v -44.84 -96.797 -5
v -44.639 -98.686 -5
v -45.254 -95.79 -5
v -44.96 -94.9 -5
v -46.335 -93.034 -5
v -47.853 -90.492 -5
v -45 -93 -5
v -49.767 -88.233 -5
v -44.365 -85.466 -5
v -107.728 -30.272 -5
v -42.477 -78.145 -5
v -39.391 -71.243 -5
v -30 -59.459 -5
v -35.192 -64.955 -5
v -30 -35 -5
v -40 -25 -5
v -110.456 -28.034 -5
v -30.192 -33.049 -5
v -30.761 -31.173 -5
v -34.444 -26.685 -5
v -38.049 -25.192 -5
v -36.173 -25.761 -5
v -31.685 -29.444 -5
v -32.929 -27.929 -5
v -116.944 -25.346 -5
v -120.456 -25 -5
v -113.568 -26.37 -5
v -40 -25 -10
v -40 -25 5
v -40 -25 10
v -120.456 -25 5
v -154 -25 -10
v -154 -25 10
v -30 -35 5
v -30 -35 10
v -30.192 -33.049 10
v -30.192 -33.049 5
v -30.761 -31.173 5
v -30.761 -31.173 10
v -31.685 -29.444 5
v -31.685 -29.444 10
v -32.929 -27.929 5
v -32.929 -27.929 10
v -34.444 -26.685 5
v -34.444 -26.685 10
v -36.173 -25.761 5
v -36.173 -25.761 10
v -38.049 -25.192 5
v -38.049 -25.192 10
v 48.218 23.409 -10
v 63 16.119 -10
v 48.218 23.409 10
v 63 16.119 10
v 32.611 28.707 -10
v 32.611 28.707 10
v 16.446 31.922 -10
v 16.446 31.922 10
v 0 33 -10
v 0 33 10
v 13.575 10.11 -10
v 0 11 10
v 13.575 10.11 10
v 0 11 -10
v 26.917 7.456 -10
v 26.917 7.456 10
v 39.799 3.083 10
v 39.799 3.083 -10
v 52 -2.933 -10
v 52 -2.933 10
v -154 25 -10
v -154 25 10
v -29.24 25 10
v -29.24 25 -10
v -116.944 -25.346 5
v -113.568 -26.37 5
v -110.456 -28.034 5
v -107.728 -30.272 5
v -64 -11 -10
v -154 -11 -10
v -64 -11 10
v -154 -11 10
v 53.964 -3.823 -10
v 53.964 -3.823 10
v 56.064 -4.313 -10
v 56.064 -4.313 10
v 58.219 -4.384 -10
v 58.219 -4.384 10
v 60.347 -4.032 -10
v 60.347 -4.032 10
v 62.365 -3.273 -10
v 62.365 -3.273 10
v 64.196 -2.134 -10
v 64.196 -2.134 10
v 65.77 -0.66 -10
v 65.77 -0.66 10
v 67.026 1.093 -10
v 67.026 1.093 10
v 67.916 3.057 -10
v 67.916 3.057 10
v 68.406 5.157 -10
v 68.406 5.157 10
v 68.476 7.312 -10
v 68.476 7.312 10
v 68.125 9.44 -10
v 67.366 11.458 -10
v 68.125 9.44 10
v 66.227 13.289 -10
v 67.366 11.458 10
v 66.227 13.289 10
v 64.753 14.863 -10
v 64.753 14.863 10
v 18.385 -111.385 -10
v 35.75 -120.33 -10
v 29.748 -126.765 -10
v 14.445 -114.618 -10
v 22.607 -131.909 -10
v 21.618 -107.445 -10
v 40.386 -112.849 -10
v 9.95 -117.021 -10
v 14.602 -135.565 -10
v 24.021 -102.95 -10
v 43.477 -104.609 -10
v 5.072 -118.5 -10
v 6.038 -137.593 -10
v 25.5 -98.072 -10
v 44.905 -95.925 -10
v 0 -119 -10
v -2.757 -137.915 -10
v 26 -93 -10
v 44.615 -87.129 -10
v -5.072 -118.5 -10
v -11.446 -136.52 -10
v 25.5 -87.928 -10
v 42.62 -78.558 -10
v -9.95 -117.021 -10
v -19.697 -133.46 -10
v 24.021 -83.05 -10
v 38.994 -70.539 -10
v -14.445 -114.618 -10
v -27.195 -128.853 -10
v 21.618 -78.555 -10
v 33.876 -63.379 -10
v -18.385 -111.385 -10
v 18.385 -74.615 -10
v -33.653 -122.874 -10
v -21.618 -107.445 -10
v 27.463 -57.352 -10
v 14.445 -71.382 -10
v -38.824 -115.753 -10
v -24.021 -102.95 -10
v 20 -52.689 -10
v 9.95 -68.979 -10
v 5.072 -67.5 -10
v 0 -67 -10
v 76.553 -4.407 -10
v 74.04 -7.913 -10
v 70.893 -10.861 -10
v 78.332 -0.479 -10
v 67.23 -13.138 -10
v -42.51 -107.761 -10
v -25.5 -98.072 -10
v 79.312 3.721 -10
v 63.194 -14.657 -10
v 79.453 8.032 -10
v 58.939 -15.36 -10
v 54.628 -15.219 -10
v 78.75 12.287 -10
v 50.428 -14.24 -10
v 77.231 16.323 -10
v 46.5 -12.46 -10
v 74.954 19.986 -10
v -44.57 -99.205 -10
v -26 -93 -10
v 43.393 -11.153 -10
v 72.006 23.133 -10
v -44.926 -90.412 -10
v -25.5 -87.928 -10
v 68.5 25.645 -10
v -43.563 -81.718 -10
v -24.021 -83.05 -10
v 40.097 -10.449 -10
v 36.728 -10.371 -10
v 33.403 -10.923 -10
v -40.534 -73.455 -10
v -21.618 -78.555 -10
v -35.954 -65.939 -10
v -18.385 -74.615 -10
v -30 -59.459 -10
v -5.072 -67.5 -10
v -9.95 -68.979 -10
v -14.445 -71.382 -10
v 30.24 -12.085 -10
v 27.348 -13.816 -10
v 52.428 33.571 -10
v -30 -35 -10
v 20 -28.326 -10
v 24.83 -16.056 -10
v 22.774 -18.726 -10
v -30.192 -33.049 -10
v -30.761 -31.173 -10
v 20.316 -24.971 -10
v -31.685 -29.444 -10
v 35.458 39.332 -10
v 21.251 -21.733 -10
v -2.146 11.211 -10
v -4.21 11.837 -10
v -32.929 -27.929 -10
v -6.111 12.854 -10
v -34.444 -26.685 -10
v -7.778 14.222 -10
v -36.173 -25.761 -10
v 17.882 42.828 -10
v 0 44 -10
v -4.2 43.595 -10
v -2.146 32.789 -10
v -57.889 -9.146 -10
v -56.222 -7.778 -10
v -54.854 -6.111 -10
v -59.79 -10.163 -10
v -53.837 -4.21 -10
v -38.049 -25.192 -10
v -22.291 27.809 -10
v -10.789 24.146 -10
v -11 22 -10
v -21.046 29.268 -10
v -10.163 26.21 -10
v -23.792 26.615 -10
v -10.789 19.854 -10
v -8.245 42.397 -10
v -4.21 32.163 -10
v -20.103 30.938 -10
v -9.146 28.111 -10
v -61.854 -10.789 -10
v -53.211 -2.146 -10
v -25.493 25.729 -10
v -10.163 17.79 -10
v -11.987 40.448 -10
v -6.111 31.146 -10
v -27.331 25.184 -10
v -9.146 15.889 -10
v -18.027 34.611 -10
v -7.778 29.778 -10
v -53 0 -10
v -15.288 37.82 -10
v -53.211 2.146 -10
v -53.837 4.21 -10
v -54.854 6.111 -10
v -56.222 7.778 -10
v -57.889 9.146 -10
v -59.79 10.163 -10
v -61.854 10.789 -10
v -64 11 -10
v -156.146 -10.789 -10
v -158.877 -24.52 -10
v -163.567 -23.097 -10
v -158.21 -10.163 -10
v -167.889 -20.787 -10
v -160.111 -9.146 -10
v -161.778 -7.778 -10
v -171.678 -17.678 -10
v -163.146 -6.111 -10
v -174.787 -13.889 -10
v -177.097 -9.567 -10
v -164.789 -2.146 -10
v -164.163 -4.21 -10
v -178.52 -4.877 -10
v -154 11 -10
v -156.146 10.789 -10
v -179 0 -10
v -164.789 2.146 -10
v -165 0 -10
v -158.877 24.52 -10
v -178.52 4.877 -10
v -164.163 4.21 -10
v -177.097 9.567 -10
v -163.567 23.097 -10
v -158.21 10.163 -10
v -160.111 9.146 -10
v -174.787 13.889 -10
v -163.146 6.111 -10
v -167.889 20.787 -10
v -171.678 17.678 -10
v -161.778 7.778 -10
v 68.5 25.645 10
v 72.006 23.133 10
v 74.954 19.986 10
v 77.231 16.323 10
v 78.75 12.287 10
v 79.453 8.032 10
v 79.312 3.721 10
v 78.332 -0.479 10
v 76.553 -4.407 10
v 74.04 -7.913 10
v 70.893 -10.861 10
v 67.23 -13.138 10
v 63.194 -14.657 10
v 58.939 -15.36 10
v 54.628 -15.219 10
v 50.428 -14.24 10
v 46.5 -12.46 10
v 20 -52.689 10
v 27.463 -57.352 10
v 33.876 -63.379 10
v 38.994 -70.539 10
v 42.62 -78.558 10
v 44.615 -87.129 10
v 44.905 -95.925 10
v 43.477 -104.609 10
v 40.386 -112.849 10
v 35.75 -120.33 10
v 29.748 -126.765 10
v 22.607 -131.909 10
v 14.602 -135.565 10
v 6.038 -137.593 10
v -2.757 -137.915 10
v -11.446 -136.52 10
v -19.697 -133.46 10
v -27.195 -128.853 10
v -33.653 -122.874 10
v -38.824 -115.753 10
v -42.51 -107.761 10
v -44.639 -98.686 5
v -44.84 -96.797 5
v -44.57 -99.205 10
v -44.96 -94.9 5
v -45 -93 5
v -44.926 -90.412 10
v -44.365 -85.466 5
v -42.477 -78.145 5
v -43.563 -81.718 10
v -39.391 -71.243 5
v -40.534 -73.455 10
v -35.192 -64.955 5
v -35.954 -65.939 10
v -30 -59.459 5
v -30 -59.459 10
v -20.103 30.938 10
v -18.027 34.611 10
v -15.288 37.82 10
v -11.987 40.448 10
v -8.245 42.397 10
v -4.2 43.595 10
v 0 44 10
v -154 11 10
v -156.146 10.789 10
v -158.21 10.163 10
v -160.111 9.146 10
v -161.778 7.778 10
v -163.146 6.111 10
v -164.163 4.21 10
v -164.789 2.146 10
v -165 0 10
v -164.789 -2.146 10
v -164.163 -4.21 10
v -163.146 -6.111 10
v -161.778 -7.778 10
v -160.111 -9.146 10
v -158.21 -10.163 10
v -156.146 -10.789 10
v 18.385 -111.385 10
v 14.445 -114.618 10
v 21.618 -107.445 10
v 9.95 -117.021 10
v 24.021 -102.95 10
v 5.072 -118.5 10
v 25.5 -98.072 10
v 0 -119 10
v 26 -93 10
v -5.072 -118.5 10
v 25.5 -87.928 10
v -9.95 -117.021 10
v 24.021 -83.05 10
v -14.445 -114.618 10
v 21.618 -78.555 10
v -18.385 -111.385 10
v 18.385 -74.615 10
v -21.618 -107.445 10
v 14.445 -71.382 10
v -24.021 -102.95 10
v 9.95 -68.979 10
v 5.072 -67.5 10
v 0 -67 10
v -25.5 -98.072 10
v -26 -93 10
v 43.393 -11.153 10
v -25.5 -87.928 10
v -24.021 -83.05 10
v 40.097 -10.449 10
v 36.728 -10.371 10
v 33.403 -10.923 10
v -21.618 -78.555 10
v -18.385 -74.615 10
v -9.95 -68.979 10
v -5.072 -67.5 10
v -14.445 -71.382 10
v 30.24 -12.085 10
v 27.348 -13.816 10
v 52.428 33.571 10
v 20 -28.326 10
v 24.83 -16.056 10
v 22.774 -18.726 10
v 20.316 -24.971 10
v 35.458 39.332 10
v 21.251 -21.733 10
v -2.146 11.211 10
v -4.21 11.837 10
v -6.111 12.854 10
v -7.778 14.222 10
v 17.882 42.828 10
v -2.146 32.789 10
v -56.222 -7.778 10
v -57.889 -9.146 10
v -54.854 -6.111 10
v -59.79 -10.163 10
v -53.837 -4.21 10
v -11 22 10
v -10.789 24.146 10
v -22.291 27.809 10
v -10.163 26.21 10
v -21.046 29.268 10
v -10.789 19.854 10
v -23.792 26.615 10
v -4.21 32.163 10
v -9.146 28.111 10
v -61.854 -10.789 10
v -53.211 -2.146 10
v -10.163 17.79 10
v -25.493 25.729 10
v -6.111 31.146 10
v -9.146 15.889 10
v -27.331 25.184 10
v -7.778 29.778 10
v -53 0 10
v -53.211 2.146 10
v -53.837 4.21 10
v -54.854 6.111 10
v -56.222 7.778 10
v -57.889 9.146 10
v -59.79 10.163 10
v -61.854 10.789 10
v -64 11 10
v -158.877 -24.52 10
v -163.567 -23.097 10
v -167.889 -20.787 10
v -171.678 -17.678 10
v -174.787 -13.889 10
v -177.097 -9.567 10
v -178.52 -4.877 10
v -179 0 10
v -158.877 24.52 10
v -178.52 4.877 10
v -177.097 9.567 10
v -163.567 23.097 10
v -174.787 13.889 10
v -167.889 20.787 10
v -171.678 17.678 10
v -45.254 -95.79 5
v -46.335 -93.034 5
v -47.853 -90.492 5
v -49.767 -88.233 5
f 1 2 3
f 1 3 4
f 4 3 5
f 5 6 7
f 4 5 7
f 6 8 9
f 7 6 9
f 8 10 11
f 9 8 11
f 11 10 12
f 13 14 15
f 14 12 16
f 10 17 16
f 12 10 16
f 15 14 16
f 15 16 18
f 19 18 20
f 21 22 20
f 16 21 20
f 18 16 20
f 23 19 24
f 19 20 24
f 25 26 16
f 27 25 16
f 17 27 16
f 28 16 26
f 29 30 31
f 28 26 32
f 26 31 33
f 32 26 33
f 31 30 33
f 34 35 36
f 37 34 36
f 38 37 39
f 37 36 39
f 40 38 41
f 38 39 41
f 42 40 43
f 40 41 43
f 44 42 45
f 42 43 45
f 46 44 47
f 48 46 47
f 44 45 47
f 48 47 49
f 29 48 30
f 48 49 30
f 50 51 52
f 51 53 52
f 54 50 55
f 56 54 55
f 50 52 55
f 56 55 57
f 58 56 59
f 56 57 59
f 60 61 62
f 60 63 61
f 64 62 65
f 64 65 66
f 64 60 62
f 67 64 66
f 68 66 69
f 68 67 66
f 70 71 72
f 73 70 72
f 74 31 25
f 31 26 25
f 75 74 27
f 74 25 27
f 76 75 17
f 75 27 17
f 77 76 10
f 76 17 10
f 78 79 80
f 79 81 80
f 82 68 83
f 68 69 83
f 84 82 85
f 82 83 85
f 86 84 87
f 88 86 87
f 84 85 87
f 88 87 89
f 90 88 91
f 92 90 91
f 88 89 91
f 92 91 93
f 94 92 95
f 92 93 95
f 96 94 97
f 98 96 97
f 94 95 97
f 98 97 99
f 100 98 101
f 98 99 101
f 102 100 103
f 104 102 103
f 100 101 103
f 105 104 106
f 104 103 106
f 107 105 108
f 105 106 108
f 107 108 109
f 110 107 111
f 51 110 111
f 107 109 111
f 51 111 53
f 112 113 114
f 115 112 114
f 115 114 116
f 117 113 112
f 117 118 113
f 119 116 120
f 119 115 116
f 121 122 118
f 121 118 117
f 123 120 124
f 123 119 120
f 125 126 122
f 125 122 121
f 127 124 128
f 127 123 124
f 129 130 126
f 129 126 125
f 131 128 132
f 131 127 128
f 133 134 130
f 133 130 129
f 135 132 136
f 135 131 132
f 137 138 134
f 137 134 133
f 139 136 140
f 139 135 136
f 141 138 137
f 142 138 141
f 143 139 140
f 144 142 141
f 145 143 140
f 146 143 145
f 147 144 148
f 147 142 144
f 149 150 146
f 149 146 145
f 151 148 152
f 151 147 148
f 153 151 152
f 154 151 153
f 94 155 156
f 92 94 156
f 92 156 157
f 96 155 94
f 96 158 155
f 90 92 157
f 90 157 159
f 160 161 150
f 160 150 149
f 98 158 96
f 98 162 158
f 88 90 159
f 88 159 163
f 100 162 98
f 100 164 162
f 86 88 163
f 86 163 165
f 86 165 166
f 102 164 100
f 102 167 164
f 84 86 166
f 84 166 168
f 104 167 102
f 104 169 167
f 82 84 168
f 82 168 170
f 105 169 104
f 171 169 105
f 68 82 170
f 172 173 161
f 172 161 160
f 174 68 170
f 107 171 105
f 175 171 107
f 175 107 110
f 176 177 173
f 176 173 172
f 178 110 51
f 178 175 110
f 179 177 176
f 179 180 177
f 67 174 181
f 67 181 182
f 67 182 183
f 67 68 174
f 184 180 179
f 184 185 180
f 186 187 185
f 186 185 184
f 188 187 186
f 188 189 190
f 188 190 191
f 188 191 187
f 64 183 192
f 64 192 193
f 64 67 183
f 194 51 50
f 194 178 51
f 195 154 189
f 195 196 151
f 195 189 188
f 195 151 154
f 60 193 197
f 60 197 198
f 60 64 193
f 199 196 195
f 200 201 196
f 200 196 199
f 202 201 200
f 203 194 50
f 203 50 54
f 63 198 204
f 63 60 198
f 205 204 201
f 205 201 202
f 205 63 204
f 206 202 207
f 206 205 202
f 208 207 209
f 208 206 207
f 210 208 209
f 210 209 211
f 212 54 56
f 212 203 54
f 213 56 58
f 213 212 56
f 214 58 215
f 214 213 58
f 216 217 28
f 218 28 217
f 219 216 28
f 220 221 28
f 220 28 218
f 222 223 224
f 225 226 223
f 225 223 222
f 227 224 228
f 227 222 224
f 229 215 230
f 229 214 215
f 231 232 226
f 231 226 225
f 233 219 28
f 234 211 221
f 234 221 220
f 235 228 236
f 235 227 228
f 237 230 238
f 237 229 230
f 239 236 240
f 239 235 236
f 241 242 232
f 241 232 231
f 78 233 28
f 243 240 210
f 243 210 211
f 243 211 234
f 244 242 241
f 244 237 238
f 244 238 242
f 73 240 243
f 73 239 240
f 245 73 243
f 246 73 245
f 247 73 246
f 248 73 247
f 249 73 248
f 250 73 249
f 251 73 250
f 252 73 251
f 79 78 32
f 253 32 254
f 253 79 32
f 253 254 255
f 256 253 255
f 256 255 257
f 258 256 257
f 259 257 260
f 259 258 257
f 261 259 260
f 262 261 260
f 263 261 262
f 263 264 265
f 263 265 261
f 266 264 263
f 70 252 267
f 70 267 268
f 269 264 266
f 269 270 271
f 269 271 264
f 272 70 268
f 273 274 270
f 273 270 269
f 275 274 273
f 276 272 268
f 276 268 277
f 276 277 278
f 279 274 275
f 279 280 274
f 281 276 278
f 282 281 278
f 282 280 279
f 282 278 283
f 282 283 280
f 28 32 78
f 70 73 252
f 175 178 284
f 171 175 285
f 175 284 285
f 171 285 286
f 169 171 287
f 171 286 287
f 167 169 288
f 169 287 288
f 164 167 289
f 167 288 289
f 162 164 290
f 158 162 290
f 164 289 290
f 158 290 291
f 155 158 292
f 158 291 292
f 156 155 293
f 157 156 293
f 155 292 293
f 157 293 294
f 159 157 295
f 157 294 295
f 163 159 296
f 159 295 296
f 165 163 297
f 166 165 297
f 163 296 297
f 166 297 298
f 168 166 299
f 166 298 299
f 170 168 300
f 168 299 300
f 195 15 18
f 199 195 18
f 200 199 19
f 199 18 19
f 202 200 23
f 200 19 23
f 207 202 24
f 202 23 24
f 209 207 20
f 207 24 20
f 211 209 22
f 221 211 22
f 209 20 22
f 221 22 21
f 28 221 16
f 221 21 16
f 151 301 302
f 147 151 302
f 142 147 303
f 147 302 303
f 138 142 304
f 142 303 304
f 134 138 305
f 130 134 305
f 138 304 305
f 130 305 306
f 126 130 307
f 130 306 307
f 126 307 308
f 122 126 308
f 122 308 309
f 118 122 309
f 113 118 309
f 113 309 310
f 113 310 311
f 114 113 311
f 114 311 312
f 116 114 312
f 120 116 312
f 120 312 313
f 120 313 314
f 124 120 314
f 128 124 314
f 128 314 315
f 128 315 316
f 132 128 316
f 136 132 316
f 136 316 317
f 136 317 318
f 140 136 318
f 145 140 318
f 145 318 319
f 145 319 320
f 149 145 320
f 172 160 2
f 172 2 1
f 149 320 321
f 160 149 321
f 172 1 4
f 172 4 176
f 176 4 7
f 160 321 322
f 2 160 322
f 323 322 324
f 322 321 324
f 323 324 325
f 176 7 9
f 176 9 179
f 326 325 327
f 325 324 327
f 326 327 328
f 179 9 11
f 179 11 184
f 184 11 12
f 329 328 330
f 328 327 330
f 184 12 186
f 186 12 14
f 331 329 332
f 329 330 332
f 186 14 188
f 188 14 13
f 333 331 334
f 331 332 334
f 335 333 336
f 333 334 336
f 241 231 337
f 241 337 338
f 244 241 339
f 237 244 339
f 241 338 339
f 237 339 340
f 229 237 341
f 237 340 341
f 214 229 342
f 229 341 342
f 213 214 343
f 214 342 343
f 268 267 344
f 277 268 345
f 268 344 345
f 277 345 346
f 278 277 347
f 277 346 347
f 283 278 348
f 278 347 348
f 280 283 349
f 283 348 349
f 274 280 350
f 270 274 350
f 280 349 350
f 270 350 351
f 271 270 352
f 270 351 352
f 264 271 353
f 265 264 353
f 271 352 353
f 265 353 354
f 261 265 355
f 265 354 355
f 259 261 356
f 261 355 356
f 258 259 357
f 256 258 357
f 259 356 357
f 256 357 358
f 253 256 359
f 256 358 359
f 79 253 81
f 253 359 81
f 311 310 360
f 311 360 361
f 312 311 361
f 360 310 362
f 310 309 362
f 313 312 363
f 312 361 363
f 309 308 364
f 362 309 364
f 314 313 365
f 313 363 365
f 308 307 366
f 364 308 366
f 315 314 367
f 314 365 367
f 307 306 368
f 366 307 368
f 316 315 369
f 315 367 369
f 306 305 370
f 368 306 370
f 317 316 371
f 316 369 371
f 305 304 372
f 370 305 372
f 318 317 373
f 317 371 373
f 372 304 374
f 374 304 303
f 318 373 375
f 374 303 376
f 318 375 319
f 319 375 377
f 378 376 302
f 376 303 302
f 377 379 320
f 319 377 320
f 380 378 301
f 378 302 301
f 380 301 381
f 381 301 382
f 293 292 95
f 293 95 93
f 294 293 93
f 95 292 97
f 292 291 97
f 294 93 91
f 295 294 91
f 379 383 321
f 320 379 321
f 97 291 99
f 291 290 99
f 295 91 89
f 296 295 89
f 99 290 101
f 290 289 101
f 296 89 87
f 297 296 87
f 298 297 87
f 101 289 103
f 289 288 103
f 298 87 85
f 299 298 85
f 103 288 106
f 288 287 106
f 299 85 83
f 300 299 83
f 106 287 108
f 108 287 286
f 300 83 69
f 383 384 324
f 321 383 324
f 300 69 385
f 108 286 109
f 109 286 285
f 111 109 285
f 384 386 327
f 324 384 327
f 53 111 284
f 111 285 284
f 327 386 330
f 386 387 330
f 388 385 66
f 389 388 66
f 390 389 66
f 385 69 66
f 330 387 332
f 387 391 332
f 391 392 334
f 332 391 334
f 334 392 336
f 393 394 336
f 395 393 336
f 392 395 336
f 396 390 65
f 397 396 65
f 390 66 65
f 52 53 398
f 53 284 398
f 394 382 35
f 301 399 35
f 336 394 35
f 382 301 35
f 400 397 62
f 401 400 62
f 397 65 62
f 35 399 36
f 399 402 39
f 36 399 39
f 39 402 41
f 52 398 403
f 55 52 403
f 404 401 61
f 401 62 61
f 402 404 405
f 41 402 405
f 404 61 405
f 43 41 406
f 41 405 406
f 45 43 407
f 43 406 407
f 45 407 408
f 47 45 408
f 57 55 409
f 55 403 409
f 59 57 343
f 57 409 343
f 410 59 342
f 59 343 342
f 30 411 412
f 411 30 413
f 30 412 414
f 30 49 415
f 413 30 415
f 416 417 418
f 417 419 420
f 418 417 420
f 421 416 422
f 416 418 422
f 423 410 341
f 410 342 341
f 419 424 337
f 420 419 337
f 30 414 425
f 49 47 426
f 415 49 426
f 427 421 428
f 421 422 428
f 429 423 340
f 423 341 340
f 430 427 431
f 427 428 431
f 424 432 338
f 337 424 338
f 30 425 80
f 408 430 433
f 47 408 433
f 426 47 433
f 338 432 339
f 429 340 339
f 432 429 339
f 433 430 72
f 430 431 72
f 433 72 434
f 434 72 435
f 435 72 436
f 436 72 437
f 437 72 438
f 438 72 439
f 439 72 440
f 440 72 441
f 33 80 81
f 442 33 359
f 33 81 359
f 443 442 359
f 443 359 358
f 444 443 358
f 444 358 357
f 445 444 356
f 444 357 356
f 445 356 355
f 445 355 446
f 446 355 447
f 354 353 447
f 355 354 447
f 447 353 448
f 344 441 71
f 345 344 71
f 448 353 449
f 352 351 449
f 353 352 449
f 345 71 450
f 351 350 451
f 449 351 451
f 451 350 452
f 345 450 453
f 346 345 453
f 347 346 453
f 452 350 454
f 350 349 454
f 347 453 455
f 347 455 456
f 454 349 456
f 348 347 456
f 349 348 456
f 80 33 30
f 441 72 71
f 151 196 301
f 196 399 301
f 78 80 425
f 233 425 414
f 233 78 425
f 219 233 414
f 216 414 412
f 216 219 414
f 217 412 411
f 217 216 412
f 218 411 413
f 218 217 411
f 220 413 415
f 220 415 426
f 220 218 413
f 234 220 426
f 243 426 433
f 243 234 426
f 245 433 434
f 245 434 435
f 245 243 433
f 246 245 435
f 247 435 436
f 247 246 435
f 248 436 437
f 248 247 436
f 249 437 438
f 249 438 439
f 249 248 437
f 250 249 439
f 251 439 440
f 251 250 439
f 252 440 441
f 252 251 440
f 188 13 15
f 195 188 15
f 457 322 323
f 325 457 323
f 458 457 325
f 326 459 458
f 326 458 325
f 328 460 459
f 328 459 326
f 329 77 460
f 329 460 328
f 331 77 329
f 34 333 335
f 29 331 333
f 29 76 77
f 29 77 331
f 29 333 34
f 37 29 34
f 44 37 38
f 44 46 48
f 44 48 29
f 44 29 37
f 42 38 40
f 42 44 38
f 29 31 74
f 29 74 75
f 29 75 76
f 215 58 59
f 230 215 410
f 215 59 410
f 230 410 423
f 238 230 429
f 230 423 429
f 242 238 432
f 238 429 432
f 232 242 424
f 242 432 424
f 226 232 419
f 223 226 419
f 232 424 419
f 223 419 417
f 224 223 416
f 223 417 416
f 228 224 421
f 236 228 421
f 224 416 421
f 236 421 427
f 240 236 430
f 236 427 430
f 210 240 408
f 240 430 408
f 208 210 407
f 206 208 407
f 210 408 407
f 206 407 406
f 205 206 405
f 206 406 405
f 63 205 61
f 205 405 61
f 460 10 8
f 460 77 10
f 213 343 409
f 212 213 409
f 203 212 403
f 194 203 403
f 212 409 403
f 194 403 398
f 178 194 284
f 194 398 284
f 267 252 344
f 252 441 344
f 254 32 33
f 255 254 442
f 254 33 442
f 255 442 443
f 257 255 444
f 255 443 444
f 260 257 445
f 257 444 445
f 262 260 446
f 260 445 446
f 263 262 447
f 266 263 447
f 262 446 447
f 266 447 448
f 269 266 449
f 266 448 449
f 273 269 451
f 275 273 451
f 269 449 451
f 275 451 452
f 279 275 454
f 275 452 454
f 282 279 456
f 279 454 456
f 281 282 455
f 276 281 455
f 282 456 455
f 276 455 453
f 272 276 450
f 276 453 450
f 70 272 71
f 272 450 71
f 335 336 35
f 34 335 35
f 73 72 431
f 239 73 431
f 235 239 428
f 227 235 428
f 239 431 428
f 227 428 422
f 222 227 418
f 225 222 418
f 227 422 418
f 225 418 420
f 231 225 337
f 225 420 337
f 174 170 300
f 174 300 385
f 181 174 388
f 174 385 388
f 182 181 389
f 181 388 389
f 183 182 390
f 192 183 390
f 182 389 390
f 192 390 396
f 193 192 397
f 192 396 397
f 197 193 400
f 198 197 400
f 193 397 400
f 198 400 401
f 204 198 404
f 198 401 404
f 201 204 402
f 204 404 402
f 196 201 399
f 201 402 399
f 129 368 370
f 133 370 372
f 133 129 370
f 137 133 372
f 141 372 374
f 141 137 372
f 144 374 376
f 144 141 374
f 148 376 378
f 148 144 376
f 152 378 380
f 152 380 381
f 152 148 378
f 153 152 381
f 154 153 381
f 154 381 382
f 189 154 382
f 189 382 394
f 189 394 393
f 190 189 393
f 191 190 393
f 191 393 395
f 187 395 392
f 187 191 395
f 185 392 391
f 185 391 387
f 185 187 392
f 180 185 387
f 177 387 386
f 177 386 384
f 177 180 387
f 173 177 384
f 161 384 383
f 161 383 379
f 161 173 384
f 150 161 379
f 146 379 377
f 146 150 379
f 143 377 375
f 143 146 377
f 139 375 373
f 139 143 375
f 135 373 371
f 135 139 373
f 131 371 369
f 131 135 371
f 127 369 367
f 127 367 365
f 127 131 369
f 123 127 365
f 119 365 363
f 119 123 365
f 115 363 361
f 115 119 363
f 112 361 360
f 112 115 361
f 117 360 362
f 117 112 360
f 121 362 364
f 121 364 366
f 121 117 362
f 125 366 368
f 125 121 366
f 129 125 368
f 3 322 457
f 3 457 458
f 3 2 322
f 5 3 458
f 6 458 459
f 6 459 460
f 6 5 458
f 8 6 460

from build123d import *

# Parameters (mm, degrees)
SKETCH_1_R      = 26
EXTRUDE_1_DEPTH = 10
EXTRUDE_2_DEPTH = 5
FILLET_1_R      = 18


with BuildPart() as part:
    # 草图1 → 凸台-拉伸1 (new, symmetric)
    with BuildSketch(Plane.XY):
        with BuildLine():
            ThreePointArc((-40, -25), (-32.928932188, -27.928932188), (-30, -35))
            Line((-30, -35), (-30, -59.458980338))
            ThreePointArc((-30, -59.458980338), (-41.079191813, -74.628826929), (-45, -93))
            ThreePointArc((-45, -93), (23.717082451, -131.242646352), (20, -52.688711259))
            Line((20, -52.688711259), (20, -28.326269101))
            ThreePointArc((20, -28.326269101), (28.753378996, -12.882823889), (46.5, -12.459637448))
            ThreePointArc((46.5, -12.459637448), (76.552558883, -4.407078565), (68.5, 25.645480318))
            ThreePointArc((68.5, 25.645480318), (35.458209179, 39.331838202), (0, 44))
            ThreePointArc((0, 44), (-11.986972095, 40.447560814), (-20.102763336, 30.9375))
            ThreePointArc((-20.102763336, 30.9375), (-23.791759355, 26.614745084), (-29.240383034, 25))
            Line((-29.240383034, 25), (-154, 25))
            ThreePointArc((-154, 25), (-179, 0), (-154, -25))
            Line((-154, -25), (-113, -25))
            Line((-113, -25), (-40, -25))
        make_face()
        with Locations((0, -93)):
            Circle(SKETCH_1_R, mode=Mode.SUBTRACT)
        with BuildLine():
            ThreePointArc((-154, -11), (-165, 0), (-154, 11))
            Line((-154, 11), (-64, 11))
            ThreePointArc((-64, 11), (-53, 0), (-64, -11))
            Line((-64, -11), (-154, -11))
        make_face(mode=Mode.SUBTRACT)
        with BuildLine():
            ThreePointArc((0, 33), (32.611199683, 28.706654112), (63, 16.119200877))
            ThreePointArc((63, 16.119200877), (67.026279442, 1.092921435), (52, -2.933358006))
            ThreePointArc((52, -2.933358006), (26.917180691, 7.456285934), (0, 11))
            ThreePointArc((0, 11), (-11, 22), (0, 33))
        make_face(mode=Mode.SUBTRACT)
    extrude(amount=EXTRUDE_1_DEPTH, both=True)

    # 草图1<3> → 凸台-拉伸2 (add, symmetric)
    with BuildSketch(Plane.XY):
        with BuildLine():
            Line((-30, -59.458980338), (-30, -35))
            ThreePointArc((-30, -35), (-32.928932188, -27.928932188), (-40, -25))
            Line((-40, -25), (-113, -25))
            Line((-113, -25), (-45, -93))
            ThreePointArc((-45, -93), (-41.079191813, -74.628826929), (-30, -59.458980338))
        make_face()
    extrude(amount=EXTRUDE_2_DEPTH, both=True)

    # 圆角1
    fillet_1_edges = [part.edges().sort_by_distance(p)[0] for p in [
        (-113, -25, 0),
        (-45, -93, 0),
    ]]
    fillet(fillet_1_edges, radius=FILLET_1_R)


solid = part.part
